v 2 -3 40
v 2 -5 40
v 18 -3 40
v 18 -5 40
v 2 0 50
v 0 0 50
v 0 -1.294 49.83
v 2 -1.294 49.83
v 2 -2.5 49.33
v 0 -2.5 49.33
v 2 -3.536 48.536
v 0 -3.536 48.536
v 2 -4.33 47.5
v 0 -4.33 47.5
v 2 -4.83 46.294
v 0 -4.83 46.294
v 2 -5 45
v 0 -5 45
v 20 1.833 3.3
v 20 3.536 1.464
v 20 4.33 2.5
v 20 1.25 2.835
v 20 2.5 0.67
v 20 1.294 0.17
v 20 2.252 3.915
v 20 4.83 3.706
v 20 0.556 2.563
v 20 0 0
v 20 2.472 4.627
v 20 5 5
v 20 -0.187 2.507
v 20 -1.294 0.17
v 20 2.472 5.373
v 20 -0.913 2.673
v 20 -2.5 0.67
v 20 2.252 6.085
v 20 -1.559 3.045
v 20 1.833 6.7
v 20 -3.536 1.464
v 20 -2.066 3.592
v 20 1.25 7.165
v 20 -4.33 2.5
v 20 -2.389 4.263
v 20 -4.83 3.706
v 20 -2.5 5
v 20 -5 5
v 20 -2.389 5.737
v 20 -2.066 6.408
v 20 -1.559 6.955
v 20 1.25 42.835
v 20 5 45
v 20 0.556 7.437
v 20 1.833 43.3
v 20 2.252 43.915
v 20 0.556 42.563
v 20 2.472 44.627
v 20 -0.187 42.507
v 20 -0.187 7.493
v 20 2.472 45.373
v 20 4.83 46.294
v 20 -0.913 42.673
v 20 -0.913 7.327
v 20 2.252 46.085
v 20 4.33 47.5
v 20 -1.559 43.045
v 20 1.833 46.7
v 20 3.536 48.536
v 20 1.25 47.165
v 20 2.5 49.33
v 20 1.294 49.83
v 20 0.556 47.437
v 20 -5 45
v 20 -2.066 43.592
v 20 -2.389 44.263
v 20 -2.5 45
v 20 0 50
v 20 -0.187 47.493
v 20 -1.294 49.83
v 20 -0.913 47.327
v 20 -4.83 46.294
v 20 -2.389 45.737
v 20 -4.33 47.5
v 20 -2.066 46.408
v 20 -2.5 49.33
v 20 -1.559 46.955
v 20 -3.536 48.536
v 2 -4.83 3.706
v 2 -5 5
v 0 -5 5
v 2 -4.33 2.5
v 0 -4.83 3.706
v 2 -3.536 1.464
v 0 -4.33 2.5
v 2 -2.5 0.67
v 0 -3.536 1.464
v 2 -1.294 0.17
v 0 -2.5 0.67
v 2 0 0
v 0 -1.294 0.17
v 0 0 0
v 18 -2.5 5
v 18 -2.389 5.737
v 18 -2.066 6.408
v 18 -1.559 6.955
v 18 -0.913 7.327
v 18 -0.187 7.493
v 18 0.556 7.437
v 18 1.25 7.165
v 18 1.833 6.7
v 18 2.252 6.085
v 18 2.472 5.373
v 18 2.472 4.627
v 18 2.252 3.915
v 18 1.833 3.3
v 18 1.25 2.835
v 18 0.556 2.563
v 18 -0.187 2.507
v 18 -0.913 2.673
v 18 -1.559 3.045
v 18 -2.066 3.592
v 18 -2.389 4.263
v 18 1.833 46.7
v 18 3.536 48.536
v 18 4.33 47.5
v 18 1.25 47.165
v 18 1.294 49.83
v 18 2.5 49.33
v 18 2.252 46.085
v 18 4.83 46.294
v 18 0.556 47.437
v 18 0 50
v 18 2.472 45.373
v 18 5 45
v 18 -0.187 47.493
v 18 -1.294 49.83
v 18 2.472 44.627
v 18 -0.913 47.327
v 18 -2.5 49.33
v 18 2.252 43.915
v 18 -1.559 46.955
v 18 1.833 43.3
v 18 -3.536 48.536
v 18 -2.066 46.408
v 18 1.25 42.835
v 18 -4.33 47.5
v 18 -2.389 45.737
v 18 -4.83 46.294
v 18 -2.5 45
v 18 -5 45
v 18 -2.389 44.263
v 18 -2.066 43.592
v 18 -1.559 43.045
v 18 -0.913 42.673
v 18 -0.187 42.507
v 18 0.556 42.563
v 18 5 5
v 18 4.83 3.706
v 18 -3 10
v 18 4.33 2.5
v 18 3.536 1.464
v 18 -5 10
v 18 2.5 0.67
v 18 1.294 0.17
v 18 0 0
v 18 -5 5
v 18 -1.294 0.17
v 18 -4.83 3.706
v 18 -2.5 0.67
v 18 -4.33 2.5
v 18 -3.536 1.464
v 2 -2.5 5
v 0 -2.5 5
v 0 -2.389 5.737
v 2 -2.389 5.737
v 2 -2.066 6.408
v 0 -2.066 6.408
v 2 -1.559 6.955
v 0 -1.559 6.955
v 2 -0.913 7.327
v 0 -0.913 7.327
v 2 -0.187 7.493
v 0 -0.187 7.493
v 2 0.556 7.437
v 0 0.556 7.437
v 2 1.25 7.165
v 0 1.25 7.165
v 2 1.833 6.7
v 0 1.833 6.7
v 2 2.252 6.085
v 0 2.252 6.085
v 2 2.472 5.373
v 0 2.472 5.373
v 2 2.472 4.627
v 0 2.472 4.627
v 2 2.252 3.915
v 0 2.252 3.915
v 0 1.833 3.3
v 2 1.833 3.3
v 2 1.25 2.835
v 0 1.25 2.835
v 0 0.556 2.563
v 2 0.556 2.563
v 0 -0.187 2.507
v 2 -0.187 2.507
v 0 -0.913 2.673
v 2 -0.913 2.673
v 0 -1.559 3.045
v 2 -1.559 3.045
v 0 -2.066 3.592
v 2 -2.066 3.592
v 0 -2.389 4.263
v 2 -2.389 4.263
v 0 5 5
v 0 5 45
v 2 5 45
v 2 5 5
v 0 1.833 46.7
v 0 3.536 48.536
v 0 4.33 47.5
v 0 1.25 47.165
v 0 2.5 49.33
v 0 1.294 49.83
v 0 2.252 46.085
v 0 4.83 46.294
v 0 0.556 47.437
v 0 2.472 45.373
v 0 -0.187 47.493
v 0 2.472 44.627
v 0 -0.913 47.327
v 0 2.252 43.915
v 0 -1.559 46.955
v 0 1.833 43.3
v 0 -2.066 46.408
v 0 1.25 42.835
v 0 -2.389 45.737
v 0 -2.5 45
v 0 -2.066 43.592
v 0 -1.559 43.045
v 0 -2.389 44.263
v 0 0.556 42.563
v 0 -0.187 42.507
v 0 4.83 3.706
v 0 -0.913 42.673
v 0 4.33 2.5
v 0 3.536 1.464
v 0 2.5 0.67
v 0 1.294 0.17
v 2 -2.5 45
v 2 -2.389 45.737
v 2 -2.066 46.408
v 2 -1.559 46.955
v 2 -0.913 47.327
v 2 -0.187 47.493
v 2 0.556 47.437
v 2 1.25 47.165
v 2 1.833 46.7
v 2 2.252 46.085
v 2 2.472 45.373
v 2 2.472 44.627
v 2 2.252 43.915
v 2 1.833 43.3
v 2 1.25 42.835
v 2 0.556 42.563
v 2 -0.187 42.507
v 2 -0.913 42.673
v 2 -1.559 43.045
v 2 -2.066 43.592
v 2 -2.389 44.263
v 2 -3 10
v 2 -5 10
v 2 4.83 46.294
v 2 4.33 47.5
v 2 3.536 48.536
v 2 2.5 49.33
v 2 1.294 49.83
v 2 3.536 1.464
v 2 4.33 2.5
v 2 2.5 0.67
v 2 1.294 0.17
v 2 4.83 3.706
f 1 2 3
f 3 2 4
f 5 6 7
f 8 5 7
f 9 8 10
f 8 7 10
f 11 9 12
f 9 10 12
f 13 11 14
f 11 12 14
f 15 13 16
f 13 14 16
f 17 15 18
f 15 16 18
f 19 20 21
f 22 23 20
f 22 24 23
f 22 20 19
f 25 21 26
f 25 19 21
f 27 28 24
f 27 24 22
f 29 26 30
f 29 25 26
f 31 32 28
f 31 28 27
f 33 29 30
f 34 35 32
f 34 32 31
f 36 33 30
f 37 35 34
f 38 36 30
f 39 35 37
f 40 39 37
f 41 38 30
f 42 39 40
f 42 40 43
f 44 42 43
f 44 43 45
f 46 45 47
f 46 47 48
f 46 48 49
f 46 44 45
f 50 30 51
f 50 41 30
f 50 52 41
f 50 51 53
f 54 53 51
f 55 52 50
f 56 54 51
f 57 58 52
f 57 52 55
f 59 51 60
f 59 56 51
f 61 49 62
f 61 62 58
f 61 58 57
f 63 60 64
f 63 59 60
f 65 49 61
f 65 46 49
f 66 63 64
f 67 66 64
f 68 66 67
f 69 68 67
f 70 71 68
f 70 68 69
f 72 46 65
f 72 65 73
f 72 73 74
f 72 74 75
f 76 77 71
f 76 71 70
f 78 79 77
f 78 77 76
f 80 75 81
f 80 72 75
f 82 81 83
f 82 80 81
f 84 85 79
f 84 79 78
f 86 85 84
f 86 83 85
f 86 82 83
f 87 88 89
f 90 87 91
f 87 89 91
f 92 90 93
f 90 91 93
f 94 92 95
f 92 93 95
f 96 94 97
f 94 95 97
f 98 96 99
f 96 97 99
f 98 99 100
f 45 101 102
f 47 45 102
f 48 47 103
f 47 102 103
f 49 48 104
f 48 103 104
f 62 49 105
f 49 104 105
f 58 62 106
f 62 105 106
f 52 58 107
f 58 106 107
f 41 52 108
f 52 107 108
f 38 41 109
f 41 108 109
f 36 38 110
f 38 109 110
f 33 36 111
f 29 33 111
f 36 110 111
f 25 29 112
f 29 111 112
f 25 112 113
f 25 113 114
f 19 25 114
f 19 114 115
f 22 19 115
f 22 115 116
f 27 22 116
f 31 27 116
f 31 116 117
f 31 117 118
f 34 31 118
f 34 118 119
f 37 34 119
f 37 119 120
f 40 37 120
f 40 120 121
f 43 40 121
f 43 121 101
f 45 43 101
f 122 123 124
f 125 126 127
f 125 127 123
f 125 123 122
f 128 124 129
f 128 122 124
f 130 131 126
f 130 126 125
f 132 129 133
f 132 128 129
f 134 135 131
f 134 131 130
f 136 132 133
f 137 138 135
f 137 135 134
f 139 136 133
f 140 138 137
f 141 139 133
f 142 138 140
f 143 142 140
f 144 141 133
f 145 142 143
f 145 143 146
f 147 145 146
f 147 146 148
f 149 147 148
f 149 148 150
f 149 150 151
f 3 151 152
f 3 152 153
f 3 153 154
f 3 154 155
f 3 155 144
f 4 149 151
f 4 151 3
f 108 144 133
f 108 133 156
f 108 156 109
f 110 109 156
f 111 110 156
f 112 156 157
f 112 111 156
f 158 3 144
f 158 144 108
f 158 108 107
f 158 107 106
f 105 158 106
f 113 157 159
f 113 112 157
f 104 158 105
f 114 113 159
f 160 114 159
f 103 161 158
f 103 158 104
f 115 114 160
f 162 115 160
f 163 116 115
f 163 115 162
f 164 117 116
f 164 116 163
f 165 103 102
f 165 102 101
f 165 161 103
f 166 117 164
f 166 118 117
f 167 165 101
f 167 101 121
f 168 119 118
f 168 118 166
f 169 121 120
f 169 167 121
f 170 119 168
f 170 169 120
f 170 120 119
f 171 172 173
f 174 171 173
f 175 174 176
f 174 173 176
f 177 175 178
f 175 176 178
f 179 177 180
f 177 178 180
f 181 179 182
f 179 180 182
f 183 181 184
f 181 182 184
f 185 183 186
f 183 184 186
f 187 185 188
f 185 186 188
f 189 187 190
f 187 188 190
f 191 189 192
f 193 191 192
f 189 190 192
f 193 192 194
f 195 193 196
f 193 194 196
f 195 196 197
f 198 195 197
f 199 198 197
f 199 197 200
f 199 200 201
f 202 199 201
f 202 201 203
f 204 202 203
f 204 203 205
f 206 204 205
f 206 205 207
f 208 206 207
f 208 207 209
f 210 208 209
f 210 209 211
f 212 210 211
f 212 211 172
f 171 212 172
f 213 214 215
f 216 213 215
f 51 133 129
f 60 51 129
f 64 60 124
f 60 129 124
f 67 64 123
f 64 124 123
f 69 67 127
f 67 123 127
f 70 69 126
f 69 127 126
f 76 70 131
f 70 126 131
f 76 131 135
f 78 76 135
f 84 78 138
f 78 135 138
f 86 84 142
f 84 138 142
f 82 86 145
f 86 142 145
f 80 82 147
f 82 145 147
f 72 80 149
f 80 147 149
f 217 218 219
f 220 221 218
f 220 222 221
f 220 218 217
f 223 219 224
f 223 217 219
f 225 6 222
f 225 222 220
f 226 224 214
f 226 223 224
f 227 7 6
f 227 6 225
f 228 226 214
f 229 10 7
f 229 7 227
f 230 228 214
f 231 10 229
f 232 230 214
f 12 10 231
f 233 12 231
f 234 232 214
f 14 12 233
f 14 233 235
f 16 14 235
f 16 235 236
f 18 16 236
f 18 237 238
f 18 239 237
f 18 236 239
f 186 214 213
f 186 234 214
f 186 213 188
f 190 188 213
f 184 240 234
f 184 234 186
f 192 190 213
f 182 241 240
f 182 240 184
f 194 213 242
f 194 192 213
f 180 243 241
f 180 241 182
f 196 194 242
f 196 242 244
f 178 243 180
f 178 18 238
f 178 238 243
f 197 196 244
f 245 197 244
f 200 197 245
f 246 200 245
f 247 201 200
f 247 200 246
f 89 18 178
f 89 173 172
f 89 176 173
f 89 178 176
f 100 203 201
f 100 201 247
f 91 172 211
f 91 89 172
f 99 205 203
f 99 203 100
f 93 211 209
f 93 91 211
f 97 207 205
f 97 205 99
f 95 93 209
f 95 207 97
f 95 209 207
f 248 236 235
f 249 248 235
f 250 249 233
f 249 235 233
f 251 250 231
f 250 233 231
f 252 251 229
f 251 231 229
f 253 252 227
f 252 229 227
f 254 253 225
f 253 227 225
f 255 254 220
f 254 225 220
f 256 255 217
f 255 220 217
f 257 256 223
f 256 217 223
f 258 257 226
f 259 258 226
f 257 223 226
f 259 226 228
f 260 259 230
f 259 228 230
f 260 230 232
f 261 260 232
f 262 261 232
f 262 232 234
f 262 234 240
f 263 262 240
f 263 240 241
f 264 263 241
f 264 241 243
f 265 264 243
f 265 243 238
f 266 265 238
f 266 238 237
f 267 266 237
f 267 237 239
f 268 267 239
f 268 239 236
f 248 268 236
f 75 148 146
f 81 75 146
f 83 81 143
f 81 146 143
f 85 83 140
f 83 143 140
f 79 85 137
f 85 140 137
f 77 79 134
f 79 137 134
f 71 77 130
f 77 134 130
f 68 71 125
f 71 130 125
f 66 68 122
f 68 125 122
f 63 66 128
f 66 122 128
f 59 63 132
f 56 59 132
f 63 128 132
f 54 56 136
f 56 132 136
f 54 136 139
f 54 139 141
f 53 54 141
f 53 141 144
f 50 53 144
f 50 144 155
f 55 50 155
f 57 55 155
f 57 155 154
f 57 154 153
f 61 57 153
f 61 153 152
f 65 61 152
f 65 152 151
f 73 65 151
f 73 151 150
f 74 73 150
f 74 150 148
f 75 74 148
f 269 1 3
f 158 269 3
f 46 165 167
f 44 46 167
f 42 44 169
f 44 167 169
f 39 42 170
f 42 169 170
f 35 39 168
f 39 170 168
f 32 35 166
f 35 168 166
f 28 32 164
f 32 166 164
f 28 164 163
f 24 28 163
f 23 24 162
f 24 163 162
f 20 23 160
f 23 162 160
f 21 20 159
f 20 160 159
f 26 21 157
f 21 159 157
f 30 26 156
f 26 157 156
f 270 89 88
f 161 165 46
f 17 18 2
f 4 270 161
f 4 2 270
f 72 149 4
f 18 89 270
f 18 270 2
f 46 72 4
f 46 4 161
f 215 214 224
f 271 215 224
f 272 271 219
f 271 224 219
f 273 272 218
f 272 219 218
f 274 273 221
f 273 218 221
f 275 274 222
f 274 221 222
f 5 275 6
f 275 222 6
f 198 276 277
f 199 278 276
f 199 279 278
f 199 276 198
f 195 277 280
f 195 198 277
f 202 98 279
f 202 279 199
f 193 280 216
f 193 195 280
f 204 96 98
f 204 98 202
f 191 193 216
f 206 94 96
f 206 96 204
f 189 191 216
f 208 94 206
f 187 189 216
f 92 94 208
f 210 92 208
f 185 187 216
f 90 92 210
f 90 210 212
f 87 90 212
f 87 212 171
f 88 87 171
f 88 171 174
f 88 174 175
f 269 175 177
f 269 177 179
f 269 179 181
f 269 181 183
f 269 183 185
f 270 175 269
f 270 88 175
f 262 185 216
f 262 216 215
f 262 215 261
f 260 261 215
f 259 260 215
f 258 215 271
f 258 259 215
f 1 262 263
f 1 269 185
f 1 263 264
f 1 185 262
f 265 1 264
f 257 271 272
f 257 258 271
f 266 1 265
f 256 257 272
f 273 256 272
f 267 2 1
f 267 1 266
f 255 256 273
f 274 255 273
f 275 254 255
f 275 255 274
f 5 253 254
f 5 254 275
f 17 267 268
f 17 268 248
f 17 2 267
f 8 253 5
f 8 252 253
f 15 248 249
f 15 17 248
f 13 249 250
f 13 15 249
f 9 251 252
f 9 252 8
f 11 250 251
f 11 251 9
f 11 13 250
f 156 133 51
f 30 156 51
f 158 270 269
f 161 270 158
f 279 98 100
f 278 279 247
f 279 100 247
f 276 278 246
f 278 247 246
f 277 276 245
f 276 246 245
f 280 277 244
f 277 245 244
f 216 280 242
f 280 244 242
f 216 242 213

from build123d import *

# Parameters (mm, degrees)
F1_DEPTH  = 5
F3_DEPTH  = 25
F5_DEPTH  = 25
F6_R      = 2.5
F7_DEPTH  = 25
F8_R      = 2.5
F9_DEPTH  = 25
F10_W     = 16
F10_H     = 30
F11_DEPTH = 2
F13_R     = 2.5
F14_DEPTH = 10


with BuildPart() as f1:
    # F0 (on Front) → F1 (new body, symmetric)
    with BuildSketch(Plane.XZ):
        Polygon((0, 50), (0, 0), (2, 0), (2, 10), (2, 40), (2, 50), align=None)
    extrude(amount=F1_DEPTH, both=True)


with BuildPart() as f1b:
    # F0 (on Front) → F1, piece 2 (new body, symmetric)
    with BuildSketch(Plane.XZ):
        Polygon((18, 40), (18, 10), (18, 0), (20, 0), (20, 50), (18, 50), align=None)
    extrude(amount=F1_DEPTH, both=True)


with BuildPart() as f3_tool:
    # F2 (on face) → F3 (new body)
    with BuildSketch(Plane(origin=(0, 0, 0), x_dir=(0, -1, 0), z_dir=(-1, 0, 0))):
        with BuildLine():
            ThreePointArc((5, 5), (3.5355339059, 1.4644660941), (0, 0))
            Line((0, 0), (5, 0))
            Line((5, 0), (5, 5))
        make_face()
        with BuildLine():
            ThreePointArc((0, 0), (-3.5355339059, 1.4644660941), (-5, 5))
            Line((-5, 5), (-5, 0))
            Line((-5, 0), (0, 0))
        make_face()
    extrude(amount=-F3_DEPTH)


with BuildPart() as f1_1:
    add(f1.part)

    # F3: cut by f3_tool
    add(f3_tool.part, mode=Mode.SUBTRACT)


with BuildPart() as f1b_1:
    add(f1b.part)

    # F3: cut by f3_tool
    add(f3_tool.part, mode=Mode.SUBTRACT)


with BuildPart() as f5_tool:
    # F4 (on face) → F5 (new body)
    with BuildSketch(Plane(origin=(0, 0, 0), x_dir=(0, -1, 0), z_dir=(-1, 0, 0))):
        with BuildLine():
            ThreePointArc((-5, 45), (-3.5355339059, 48.5355339059), (0, 50))
            Line((0, 50), (-5, 50))
            Line((-5, 50), (-5, 45))
        make_face()
        with BuildLine():
            ThreePointArc((0, 50), (3.5355339059, 48.5355339059), (5, 45))
            Line((5, 45), (5, 50))
            Line((5, 50), (0, 50))
        make_face()
    extrude(amount=-F5_DEPTH)


with BuildPart() as f1_2:
    add(f1_1.part)

    # F5: cut by f5_tool
    add(f5_tool.part, mode=Mode.SUBTRACT)


with BuildPart() as f1b_2:
    add(f1b_1.part)

    # F5: cut by f5_tool
    add(f5_tool.part, mode=Mode.SUBTRACT)


with BuildPart() as f7_tool:
    # F6 (on face) → F7 (new body)
    with BuildSketch(Plane(origin=(0, 0, 0), x_dir=(0, -1, 0), z_dir=(-1, 0, 0))):
        with Locations((0, 45)):
            Circle(F6_R)
    extrude(amount=-F7_DEPTH)


with BuildPart() as f1_3:
    add(f1_2.part)

    # F7: cut by f7_tool
    add(f7_tool.part, mode=Mode.SUBTRACT)


with BuildPart() as f1b_3:
    add(f1b_2.part)

    # F7: cut by f7_tool
    add(f7_tool.part, mode=Mode.SUBTRACT)


with BuildPart() as f9_tool:
    # F8 (on face) → F9 (new body)
    with BuildSketch(Plane(origin=(0, 0, 0), x_dir=(0, -1, 0), z_dir=(-1, 0, 0))):
        with Locations((0, 5)):
            Circle(F8_R)
    extrude(amount=-F9_DEPTH)


with BuildPart() as f1_4:
    add(f1_3.part)

    # F9: cut by f9_tool
    add(f9_tool.part, mode=Mode.SUBTRACT)


with BuildPart() as f1b_4:
    add(f1b_3.part)

    # F9: cut by f9_tool
    add(f9_tool.part, mode=Mode.SUBTRACT)


with BuildPart() as f11:
    # F10 (on face) → F11 (new body)
    with BuildSketch(Plane.XZ.offset(5)):
        with Locations((10, 25)):
            Rectangle(F10_W, F10_H)
    extrude(amount=-F11_DEPTH)


with BuildPart() as f1_5:
    add(f1_4.part)

    # F12: union F1b, F11
    add(f1b_4.part)
    add(f11.part)

    # F13 (on face) → F14 (cut)
    with BuildSketch(Plane.YZ.offset(20)):
        with BuildLine():
            ThreePointArc((-5, 45), (-3.5355339059, 48.5355339059), (0, 50))
            Line((0, 50), (-5, 50))
            Line((-5, 50), (-5, 45))
        make_face()
        with BuildLine():
            ThreePointArc((0, 50), (3.5355339059, 48.5355339059), (5, 45))
            Line((5, 45), (5, 50))
            Line((5, 50), (0, 50))
        make_face()
        with Locations((0, 45)):
            Circle(F13_R)
        with BuildLine():
            ThreePointArc((5, 5), (3.5355339059, 1.4644660941), (0, 0))
            Line((0, 0), (5, 0))
            Line((5, 0), (5, 5))
        make_face()
        with BuildLine():
            ThreePointArc((0, 0), (-3.5355339059, 1.4644660941), (-5, 5))
            Line((-5, 5), (-5, 0))
            Line((-5, 0), (0, 0))
        make_face()
        with Locations((0, 5)):
            Circle(F13_R)
    extrude(amount=-F14_DEPTH, mode=Mode.SUBTRACT)


solid = f1_5.part
